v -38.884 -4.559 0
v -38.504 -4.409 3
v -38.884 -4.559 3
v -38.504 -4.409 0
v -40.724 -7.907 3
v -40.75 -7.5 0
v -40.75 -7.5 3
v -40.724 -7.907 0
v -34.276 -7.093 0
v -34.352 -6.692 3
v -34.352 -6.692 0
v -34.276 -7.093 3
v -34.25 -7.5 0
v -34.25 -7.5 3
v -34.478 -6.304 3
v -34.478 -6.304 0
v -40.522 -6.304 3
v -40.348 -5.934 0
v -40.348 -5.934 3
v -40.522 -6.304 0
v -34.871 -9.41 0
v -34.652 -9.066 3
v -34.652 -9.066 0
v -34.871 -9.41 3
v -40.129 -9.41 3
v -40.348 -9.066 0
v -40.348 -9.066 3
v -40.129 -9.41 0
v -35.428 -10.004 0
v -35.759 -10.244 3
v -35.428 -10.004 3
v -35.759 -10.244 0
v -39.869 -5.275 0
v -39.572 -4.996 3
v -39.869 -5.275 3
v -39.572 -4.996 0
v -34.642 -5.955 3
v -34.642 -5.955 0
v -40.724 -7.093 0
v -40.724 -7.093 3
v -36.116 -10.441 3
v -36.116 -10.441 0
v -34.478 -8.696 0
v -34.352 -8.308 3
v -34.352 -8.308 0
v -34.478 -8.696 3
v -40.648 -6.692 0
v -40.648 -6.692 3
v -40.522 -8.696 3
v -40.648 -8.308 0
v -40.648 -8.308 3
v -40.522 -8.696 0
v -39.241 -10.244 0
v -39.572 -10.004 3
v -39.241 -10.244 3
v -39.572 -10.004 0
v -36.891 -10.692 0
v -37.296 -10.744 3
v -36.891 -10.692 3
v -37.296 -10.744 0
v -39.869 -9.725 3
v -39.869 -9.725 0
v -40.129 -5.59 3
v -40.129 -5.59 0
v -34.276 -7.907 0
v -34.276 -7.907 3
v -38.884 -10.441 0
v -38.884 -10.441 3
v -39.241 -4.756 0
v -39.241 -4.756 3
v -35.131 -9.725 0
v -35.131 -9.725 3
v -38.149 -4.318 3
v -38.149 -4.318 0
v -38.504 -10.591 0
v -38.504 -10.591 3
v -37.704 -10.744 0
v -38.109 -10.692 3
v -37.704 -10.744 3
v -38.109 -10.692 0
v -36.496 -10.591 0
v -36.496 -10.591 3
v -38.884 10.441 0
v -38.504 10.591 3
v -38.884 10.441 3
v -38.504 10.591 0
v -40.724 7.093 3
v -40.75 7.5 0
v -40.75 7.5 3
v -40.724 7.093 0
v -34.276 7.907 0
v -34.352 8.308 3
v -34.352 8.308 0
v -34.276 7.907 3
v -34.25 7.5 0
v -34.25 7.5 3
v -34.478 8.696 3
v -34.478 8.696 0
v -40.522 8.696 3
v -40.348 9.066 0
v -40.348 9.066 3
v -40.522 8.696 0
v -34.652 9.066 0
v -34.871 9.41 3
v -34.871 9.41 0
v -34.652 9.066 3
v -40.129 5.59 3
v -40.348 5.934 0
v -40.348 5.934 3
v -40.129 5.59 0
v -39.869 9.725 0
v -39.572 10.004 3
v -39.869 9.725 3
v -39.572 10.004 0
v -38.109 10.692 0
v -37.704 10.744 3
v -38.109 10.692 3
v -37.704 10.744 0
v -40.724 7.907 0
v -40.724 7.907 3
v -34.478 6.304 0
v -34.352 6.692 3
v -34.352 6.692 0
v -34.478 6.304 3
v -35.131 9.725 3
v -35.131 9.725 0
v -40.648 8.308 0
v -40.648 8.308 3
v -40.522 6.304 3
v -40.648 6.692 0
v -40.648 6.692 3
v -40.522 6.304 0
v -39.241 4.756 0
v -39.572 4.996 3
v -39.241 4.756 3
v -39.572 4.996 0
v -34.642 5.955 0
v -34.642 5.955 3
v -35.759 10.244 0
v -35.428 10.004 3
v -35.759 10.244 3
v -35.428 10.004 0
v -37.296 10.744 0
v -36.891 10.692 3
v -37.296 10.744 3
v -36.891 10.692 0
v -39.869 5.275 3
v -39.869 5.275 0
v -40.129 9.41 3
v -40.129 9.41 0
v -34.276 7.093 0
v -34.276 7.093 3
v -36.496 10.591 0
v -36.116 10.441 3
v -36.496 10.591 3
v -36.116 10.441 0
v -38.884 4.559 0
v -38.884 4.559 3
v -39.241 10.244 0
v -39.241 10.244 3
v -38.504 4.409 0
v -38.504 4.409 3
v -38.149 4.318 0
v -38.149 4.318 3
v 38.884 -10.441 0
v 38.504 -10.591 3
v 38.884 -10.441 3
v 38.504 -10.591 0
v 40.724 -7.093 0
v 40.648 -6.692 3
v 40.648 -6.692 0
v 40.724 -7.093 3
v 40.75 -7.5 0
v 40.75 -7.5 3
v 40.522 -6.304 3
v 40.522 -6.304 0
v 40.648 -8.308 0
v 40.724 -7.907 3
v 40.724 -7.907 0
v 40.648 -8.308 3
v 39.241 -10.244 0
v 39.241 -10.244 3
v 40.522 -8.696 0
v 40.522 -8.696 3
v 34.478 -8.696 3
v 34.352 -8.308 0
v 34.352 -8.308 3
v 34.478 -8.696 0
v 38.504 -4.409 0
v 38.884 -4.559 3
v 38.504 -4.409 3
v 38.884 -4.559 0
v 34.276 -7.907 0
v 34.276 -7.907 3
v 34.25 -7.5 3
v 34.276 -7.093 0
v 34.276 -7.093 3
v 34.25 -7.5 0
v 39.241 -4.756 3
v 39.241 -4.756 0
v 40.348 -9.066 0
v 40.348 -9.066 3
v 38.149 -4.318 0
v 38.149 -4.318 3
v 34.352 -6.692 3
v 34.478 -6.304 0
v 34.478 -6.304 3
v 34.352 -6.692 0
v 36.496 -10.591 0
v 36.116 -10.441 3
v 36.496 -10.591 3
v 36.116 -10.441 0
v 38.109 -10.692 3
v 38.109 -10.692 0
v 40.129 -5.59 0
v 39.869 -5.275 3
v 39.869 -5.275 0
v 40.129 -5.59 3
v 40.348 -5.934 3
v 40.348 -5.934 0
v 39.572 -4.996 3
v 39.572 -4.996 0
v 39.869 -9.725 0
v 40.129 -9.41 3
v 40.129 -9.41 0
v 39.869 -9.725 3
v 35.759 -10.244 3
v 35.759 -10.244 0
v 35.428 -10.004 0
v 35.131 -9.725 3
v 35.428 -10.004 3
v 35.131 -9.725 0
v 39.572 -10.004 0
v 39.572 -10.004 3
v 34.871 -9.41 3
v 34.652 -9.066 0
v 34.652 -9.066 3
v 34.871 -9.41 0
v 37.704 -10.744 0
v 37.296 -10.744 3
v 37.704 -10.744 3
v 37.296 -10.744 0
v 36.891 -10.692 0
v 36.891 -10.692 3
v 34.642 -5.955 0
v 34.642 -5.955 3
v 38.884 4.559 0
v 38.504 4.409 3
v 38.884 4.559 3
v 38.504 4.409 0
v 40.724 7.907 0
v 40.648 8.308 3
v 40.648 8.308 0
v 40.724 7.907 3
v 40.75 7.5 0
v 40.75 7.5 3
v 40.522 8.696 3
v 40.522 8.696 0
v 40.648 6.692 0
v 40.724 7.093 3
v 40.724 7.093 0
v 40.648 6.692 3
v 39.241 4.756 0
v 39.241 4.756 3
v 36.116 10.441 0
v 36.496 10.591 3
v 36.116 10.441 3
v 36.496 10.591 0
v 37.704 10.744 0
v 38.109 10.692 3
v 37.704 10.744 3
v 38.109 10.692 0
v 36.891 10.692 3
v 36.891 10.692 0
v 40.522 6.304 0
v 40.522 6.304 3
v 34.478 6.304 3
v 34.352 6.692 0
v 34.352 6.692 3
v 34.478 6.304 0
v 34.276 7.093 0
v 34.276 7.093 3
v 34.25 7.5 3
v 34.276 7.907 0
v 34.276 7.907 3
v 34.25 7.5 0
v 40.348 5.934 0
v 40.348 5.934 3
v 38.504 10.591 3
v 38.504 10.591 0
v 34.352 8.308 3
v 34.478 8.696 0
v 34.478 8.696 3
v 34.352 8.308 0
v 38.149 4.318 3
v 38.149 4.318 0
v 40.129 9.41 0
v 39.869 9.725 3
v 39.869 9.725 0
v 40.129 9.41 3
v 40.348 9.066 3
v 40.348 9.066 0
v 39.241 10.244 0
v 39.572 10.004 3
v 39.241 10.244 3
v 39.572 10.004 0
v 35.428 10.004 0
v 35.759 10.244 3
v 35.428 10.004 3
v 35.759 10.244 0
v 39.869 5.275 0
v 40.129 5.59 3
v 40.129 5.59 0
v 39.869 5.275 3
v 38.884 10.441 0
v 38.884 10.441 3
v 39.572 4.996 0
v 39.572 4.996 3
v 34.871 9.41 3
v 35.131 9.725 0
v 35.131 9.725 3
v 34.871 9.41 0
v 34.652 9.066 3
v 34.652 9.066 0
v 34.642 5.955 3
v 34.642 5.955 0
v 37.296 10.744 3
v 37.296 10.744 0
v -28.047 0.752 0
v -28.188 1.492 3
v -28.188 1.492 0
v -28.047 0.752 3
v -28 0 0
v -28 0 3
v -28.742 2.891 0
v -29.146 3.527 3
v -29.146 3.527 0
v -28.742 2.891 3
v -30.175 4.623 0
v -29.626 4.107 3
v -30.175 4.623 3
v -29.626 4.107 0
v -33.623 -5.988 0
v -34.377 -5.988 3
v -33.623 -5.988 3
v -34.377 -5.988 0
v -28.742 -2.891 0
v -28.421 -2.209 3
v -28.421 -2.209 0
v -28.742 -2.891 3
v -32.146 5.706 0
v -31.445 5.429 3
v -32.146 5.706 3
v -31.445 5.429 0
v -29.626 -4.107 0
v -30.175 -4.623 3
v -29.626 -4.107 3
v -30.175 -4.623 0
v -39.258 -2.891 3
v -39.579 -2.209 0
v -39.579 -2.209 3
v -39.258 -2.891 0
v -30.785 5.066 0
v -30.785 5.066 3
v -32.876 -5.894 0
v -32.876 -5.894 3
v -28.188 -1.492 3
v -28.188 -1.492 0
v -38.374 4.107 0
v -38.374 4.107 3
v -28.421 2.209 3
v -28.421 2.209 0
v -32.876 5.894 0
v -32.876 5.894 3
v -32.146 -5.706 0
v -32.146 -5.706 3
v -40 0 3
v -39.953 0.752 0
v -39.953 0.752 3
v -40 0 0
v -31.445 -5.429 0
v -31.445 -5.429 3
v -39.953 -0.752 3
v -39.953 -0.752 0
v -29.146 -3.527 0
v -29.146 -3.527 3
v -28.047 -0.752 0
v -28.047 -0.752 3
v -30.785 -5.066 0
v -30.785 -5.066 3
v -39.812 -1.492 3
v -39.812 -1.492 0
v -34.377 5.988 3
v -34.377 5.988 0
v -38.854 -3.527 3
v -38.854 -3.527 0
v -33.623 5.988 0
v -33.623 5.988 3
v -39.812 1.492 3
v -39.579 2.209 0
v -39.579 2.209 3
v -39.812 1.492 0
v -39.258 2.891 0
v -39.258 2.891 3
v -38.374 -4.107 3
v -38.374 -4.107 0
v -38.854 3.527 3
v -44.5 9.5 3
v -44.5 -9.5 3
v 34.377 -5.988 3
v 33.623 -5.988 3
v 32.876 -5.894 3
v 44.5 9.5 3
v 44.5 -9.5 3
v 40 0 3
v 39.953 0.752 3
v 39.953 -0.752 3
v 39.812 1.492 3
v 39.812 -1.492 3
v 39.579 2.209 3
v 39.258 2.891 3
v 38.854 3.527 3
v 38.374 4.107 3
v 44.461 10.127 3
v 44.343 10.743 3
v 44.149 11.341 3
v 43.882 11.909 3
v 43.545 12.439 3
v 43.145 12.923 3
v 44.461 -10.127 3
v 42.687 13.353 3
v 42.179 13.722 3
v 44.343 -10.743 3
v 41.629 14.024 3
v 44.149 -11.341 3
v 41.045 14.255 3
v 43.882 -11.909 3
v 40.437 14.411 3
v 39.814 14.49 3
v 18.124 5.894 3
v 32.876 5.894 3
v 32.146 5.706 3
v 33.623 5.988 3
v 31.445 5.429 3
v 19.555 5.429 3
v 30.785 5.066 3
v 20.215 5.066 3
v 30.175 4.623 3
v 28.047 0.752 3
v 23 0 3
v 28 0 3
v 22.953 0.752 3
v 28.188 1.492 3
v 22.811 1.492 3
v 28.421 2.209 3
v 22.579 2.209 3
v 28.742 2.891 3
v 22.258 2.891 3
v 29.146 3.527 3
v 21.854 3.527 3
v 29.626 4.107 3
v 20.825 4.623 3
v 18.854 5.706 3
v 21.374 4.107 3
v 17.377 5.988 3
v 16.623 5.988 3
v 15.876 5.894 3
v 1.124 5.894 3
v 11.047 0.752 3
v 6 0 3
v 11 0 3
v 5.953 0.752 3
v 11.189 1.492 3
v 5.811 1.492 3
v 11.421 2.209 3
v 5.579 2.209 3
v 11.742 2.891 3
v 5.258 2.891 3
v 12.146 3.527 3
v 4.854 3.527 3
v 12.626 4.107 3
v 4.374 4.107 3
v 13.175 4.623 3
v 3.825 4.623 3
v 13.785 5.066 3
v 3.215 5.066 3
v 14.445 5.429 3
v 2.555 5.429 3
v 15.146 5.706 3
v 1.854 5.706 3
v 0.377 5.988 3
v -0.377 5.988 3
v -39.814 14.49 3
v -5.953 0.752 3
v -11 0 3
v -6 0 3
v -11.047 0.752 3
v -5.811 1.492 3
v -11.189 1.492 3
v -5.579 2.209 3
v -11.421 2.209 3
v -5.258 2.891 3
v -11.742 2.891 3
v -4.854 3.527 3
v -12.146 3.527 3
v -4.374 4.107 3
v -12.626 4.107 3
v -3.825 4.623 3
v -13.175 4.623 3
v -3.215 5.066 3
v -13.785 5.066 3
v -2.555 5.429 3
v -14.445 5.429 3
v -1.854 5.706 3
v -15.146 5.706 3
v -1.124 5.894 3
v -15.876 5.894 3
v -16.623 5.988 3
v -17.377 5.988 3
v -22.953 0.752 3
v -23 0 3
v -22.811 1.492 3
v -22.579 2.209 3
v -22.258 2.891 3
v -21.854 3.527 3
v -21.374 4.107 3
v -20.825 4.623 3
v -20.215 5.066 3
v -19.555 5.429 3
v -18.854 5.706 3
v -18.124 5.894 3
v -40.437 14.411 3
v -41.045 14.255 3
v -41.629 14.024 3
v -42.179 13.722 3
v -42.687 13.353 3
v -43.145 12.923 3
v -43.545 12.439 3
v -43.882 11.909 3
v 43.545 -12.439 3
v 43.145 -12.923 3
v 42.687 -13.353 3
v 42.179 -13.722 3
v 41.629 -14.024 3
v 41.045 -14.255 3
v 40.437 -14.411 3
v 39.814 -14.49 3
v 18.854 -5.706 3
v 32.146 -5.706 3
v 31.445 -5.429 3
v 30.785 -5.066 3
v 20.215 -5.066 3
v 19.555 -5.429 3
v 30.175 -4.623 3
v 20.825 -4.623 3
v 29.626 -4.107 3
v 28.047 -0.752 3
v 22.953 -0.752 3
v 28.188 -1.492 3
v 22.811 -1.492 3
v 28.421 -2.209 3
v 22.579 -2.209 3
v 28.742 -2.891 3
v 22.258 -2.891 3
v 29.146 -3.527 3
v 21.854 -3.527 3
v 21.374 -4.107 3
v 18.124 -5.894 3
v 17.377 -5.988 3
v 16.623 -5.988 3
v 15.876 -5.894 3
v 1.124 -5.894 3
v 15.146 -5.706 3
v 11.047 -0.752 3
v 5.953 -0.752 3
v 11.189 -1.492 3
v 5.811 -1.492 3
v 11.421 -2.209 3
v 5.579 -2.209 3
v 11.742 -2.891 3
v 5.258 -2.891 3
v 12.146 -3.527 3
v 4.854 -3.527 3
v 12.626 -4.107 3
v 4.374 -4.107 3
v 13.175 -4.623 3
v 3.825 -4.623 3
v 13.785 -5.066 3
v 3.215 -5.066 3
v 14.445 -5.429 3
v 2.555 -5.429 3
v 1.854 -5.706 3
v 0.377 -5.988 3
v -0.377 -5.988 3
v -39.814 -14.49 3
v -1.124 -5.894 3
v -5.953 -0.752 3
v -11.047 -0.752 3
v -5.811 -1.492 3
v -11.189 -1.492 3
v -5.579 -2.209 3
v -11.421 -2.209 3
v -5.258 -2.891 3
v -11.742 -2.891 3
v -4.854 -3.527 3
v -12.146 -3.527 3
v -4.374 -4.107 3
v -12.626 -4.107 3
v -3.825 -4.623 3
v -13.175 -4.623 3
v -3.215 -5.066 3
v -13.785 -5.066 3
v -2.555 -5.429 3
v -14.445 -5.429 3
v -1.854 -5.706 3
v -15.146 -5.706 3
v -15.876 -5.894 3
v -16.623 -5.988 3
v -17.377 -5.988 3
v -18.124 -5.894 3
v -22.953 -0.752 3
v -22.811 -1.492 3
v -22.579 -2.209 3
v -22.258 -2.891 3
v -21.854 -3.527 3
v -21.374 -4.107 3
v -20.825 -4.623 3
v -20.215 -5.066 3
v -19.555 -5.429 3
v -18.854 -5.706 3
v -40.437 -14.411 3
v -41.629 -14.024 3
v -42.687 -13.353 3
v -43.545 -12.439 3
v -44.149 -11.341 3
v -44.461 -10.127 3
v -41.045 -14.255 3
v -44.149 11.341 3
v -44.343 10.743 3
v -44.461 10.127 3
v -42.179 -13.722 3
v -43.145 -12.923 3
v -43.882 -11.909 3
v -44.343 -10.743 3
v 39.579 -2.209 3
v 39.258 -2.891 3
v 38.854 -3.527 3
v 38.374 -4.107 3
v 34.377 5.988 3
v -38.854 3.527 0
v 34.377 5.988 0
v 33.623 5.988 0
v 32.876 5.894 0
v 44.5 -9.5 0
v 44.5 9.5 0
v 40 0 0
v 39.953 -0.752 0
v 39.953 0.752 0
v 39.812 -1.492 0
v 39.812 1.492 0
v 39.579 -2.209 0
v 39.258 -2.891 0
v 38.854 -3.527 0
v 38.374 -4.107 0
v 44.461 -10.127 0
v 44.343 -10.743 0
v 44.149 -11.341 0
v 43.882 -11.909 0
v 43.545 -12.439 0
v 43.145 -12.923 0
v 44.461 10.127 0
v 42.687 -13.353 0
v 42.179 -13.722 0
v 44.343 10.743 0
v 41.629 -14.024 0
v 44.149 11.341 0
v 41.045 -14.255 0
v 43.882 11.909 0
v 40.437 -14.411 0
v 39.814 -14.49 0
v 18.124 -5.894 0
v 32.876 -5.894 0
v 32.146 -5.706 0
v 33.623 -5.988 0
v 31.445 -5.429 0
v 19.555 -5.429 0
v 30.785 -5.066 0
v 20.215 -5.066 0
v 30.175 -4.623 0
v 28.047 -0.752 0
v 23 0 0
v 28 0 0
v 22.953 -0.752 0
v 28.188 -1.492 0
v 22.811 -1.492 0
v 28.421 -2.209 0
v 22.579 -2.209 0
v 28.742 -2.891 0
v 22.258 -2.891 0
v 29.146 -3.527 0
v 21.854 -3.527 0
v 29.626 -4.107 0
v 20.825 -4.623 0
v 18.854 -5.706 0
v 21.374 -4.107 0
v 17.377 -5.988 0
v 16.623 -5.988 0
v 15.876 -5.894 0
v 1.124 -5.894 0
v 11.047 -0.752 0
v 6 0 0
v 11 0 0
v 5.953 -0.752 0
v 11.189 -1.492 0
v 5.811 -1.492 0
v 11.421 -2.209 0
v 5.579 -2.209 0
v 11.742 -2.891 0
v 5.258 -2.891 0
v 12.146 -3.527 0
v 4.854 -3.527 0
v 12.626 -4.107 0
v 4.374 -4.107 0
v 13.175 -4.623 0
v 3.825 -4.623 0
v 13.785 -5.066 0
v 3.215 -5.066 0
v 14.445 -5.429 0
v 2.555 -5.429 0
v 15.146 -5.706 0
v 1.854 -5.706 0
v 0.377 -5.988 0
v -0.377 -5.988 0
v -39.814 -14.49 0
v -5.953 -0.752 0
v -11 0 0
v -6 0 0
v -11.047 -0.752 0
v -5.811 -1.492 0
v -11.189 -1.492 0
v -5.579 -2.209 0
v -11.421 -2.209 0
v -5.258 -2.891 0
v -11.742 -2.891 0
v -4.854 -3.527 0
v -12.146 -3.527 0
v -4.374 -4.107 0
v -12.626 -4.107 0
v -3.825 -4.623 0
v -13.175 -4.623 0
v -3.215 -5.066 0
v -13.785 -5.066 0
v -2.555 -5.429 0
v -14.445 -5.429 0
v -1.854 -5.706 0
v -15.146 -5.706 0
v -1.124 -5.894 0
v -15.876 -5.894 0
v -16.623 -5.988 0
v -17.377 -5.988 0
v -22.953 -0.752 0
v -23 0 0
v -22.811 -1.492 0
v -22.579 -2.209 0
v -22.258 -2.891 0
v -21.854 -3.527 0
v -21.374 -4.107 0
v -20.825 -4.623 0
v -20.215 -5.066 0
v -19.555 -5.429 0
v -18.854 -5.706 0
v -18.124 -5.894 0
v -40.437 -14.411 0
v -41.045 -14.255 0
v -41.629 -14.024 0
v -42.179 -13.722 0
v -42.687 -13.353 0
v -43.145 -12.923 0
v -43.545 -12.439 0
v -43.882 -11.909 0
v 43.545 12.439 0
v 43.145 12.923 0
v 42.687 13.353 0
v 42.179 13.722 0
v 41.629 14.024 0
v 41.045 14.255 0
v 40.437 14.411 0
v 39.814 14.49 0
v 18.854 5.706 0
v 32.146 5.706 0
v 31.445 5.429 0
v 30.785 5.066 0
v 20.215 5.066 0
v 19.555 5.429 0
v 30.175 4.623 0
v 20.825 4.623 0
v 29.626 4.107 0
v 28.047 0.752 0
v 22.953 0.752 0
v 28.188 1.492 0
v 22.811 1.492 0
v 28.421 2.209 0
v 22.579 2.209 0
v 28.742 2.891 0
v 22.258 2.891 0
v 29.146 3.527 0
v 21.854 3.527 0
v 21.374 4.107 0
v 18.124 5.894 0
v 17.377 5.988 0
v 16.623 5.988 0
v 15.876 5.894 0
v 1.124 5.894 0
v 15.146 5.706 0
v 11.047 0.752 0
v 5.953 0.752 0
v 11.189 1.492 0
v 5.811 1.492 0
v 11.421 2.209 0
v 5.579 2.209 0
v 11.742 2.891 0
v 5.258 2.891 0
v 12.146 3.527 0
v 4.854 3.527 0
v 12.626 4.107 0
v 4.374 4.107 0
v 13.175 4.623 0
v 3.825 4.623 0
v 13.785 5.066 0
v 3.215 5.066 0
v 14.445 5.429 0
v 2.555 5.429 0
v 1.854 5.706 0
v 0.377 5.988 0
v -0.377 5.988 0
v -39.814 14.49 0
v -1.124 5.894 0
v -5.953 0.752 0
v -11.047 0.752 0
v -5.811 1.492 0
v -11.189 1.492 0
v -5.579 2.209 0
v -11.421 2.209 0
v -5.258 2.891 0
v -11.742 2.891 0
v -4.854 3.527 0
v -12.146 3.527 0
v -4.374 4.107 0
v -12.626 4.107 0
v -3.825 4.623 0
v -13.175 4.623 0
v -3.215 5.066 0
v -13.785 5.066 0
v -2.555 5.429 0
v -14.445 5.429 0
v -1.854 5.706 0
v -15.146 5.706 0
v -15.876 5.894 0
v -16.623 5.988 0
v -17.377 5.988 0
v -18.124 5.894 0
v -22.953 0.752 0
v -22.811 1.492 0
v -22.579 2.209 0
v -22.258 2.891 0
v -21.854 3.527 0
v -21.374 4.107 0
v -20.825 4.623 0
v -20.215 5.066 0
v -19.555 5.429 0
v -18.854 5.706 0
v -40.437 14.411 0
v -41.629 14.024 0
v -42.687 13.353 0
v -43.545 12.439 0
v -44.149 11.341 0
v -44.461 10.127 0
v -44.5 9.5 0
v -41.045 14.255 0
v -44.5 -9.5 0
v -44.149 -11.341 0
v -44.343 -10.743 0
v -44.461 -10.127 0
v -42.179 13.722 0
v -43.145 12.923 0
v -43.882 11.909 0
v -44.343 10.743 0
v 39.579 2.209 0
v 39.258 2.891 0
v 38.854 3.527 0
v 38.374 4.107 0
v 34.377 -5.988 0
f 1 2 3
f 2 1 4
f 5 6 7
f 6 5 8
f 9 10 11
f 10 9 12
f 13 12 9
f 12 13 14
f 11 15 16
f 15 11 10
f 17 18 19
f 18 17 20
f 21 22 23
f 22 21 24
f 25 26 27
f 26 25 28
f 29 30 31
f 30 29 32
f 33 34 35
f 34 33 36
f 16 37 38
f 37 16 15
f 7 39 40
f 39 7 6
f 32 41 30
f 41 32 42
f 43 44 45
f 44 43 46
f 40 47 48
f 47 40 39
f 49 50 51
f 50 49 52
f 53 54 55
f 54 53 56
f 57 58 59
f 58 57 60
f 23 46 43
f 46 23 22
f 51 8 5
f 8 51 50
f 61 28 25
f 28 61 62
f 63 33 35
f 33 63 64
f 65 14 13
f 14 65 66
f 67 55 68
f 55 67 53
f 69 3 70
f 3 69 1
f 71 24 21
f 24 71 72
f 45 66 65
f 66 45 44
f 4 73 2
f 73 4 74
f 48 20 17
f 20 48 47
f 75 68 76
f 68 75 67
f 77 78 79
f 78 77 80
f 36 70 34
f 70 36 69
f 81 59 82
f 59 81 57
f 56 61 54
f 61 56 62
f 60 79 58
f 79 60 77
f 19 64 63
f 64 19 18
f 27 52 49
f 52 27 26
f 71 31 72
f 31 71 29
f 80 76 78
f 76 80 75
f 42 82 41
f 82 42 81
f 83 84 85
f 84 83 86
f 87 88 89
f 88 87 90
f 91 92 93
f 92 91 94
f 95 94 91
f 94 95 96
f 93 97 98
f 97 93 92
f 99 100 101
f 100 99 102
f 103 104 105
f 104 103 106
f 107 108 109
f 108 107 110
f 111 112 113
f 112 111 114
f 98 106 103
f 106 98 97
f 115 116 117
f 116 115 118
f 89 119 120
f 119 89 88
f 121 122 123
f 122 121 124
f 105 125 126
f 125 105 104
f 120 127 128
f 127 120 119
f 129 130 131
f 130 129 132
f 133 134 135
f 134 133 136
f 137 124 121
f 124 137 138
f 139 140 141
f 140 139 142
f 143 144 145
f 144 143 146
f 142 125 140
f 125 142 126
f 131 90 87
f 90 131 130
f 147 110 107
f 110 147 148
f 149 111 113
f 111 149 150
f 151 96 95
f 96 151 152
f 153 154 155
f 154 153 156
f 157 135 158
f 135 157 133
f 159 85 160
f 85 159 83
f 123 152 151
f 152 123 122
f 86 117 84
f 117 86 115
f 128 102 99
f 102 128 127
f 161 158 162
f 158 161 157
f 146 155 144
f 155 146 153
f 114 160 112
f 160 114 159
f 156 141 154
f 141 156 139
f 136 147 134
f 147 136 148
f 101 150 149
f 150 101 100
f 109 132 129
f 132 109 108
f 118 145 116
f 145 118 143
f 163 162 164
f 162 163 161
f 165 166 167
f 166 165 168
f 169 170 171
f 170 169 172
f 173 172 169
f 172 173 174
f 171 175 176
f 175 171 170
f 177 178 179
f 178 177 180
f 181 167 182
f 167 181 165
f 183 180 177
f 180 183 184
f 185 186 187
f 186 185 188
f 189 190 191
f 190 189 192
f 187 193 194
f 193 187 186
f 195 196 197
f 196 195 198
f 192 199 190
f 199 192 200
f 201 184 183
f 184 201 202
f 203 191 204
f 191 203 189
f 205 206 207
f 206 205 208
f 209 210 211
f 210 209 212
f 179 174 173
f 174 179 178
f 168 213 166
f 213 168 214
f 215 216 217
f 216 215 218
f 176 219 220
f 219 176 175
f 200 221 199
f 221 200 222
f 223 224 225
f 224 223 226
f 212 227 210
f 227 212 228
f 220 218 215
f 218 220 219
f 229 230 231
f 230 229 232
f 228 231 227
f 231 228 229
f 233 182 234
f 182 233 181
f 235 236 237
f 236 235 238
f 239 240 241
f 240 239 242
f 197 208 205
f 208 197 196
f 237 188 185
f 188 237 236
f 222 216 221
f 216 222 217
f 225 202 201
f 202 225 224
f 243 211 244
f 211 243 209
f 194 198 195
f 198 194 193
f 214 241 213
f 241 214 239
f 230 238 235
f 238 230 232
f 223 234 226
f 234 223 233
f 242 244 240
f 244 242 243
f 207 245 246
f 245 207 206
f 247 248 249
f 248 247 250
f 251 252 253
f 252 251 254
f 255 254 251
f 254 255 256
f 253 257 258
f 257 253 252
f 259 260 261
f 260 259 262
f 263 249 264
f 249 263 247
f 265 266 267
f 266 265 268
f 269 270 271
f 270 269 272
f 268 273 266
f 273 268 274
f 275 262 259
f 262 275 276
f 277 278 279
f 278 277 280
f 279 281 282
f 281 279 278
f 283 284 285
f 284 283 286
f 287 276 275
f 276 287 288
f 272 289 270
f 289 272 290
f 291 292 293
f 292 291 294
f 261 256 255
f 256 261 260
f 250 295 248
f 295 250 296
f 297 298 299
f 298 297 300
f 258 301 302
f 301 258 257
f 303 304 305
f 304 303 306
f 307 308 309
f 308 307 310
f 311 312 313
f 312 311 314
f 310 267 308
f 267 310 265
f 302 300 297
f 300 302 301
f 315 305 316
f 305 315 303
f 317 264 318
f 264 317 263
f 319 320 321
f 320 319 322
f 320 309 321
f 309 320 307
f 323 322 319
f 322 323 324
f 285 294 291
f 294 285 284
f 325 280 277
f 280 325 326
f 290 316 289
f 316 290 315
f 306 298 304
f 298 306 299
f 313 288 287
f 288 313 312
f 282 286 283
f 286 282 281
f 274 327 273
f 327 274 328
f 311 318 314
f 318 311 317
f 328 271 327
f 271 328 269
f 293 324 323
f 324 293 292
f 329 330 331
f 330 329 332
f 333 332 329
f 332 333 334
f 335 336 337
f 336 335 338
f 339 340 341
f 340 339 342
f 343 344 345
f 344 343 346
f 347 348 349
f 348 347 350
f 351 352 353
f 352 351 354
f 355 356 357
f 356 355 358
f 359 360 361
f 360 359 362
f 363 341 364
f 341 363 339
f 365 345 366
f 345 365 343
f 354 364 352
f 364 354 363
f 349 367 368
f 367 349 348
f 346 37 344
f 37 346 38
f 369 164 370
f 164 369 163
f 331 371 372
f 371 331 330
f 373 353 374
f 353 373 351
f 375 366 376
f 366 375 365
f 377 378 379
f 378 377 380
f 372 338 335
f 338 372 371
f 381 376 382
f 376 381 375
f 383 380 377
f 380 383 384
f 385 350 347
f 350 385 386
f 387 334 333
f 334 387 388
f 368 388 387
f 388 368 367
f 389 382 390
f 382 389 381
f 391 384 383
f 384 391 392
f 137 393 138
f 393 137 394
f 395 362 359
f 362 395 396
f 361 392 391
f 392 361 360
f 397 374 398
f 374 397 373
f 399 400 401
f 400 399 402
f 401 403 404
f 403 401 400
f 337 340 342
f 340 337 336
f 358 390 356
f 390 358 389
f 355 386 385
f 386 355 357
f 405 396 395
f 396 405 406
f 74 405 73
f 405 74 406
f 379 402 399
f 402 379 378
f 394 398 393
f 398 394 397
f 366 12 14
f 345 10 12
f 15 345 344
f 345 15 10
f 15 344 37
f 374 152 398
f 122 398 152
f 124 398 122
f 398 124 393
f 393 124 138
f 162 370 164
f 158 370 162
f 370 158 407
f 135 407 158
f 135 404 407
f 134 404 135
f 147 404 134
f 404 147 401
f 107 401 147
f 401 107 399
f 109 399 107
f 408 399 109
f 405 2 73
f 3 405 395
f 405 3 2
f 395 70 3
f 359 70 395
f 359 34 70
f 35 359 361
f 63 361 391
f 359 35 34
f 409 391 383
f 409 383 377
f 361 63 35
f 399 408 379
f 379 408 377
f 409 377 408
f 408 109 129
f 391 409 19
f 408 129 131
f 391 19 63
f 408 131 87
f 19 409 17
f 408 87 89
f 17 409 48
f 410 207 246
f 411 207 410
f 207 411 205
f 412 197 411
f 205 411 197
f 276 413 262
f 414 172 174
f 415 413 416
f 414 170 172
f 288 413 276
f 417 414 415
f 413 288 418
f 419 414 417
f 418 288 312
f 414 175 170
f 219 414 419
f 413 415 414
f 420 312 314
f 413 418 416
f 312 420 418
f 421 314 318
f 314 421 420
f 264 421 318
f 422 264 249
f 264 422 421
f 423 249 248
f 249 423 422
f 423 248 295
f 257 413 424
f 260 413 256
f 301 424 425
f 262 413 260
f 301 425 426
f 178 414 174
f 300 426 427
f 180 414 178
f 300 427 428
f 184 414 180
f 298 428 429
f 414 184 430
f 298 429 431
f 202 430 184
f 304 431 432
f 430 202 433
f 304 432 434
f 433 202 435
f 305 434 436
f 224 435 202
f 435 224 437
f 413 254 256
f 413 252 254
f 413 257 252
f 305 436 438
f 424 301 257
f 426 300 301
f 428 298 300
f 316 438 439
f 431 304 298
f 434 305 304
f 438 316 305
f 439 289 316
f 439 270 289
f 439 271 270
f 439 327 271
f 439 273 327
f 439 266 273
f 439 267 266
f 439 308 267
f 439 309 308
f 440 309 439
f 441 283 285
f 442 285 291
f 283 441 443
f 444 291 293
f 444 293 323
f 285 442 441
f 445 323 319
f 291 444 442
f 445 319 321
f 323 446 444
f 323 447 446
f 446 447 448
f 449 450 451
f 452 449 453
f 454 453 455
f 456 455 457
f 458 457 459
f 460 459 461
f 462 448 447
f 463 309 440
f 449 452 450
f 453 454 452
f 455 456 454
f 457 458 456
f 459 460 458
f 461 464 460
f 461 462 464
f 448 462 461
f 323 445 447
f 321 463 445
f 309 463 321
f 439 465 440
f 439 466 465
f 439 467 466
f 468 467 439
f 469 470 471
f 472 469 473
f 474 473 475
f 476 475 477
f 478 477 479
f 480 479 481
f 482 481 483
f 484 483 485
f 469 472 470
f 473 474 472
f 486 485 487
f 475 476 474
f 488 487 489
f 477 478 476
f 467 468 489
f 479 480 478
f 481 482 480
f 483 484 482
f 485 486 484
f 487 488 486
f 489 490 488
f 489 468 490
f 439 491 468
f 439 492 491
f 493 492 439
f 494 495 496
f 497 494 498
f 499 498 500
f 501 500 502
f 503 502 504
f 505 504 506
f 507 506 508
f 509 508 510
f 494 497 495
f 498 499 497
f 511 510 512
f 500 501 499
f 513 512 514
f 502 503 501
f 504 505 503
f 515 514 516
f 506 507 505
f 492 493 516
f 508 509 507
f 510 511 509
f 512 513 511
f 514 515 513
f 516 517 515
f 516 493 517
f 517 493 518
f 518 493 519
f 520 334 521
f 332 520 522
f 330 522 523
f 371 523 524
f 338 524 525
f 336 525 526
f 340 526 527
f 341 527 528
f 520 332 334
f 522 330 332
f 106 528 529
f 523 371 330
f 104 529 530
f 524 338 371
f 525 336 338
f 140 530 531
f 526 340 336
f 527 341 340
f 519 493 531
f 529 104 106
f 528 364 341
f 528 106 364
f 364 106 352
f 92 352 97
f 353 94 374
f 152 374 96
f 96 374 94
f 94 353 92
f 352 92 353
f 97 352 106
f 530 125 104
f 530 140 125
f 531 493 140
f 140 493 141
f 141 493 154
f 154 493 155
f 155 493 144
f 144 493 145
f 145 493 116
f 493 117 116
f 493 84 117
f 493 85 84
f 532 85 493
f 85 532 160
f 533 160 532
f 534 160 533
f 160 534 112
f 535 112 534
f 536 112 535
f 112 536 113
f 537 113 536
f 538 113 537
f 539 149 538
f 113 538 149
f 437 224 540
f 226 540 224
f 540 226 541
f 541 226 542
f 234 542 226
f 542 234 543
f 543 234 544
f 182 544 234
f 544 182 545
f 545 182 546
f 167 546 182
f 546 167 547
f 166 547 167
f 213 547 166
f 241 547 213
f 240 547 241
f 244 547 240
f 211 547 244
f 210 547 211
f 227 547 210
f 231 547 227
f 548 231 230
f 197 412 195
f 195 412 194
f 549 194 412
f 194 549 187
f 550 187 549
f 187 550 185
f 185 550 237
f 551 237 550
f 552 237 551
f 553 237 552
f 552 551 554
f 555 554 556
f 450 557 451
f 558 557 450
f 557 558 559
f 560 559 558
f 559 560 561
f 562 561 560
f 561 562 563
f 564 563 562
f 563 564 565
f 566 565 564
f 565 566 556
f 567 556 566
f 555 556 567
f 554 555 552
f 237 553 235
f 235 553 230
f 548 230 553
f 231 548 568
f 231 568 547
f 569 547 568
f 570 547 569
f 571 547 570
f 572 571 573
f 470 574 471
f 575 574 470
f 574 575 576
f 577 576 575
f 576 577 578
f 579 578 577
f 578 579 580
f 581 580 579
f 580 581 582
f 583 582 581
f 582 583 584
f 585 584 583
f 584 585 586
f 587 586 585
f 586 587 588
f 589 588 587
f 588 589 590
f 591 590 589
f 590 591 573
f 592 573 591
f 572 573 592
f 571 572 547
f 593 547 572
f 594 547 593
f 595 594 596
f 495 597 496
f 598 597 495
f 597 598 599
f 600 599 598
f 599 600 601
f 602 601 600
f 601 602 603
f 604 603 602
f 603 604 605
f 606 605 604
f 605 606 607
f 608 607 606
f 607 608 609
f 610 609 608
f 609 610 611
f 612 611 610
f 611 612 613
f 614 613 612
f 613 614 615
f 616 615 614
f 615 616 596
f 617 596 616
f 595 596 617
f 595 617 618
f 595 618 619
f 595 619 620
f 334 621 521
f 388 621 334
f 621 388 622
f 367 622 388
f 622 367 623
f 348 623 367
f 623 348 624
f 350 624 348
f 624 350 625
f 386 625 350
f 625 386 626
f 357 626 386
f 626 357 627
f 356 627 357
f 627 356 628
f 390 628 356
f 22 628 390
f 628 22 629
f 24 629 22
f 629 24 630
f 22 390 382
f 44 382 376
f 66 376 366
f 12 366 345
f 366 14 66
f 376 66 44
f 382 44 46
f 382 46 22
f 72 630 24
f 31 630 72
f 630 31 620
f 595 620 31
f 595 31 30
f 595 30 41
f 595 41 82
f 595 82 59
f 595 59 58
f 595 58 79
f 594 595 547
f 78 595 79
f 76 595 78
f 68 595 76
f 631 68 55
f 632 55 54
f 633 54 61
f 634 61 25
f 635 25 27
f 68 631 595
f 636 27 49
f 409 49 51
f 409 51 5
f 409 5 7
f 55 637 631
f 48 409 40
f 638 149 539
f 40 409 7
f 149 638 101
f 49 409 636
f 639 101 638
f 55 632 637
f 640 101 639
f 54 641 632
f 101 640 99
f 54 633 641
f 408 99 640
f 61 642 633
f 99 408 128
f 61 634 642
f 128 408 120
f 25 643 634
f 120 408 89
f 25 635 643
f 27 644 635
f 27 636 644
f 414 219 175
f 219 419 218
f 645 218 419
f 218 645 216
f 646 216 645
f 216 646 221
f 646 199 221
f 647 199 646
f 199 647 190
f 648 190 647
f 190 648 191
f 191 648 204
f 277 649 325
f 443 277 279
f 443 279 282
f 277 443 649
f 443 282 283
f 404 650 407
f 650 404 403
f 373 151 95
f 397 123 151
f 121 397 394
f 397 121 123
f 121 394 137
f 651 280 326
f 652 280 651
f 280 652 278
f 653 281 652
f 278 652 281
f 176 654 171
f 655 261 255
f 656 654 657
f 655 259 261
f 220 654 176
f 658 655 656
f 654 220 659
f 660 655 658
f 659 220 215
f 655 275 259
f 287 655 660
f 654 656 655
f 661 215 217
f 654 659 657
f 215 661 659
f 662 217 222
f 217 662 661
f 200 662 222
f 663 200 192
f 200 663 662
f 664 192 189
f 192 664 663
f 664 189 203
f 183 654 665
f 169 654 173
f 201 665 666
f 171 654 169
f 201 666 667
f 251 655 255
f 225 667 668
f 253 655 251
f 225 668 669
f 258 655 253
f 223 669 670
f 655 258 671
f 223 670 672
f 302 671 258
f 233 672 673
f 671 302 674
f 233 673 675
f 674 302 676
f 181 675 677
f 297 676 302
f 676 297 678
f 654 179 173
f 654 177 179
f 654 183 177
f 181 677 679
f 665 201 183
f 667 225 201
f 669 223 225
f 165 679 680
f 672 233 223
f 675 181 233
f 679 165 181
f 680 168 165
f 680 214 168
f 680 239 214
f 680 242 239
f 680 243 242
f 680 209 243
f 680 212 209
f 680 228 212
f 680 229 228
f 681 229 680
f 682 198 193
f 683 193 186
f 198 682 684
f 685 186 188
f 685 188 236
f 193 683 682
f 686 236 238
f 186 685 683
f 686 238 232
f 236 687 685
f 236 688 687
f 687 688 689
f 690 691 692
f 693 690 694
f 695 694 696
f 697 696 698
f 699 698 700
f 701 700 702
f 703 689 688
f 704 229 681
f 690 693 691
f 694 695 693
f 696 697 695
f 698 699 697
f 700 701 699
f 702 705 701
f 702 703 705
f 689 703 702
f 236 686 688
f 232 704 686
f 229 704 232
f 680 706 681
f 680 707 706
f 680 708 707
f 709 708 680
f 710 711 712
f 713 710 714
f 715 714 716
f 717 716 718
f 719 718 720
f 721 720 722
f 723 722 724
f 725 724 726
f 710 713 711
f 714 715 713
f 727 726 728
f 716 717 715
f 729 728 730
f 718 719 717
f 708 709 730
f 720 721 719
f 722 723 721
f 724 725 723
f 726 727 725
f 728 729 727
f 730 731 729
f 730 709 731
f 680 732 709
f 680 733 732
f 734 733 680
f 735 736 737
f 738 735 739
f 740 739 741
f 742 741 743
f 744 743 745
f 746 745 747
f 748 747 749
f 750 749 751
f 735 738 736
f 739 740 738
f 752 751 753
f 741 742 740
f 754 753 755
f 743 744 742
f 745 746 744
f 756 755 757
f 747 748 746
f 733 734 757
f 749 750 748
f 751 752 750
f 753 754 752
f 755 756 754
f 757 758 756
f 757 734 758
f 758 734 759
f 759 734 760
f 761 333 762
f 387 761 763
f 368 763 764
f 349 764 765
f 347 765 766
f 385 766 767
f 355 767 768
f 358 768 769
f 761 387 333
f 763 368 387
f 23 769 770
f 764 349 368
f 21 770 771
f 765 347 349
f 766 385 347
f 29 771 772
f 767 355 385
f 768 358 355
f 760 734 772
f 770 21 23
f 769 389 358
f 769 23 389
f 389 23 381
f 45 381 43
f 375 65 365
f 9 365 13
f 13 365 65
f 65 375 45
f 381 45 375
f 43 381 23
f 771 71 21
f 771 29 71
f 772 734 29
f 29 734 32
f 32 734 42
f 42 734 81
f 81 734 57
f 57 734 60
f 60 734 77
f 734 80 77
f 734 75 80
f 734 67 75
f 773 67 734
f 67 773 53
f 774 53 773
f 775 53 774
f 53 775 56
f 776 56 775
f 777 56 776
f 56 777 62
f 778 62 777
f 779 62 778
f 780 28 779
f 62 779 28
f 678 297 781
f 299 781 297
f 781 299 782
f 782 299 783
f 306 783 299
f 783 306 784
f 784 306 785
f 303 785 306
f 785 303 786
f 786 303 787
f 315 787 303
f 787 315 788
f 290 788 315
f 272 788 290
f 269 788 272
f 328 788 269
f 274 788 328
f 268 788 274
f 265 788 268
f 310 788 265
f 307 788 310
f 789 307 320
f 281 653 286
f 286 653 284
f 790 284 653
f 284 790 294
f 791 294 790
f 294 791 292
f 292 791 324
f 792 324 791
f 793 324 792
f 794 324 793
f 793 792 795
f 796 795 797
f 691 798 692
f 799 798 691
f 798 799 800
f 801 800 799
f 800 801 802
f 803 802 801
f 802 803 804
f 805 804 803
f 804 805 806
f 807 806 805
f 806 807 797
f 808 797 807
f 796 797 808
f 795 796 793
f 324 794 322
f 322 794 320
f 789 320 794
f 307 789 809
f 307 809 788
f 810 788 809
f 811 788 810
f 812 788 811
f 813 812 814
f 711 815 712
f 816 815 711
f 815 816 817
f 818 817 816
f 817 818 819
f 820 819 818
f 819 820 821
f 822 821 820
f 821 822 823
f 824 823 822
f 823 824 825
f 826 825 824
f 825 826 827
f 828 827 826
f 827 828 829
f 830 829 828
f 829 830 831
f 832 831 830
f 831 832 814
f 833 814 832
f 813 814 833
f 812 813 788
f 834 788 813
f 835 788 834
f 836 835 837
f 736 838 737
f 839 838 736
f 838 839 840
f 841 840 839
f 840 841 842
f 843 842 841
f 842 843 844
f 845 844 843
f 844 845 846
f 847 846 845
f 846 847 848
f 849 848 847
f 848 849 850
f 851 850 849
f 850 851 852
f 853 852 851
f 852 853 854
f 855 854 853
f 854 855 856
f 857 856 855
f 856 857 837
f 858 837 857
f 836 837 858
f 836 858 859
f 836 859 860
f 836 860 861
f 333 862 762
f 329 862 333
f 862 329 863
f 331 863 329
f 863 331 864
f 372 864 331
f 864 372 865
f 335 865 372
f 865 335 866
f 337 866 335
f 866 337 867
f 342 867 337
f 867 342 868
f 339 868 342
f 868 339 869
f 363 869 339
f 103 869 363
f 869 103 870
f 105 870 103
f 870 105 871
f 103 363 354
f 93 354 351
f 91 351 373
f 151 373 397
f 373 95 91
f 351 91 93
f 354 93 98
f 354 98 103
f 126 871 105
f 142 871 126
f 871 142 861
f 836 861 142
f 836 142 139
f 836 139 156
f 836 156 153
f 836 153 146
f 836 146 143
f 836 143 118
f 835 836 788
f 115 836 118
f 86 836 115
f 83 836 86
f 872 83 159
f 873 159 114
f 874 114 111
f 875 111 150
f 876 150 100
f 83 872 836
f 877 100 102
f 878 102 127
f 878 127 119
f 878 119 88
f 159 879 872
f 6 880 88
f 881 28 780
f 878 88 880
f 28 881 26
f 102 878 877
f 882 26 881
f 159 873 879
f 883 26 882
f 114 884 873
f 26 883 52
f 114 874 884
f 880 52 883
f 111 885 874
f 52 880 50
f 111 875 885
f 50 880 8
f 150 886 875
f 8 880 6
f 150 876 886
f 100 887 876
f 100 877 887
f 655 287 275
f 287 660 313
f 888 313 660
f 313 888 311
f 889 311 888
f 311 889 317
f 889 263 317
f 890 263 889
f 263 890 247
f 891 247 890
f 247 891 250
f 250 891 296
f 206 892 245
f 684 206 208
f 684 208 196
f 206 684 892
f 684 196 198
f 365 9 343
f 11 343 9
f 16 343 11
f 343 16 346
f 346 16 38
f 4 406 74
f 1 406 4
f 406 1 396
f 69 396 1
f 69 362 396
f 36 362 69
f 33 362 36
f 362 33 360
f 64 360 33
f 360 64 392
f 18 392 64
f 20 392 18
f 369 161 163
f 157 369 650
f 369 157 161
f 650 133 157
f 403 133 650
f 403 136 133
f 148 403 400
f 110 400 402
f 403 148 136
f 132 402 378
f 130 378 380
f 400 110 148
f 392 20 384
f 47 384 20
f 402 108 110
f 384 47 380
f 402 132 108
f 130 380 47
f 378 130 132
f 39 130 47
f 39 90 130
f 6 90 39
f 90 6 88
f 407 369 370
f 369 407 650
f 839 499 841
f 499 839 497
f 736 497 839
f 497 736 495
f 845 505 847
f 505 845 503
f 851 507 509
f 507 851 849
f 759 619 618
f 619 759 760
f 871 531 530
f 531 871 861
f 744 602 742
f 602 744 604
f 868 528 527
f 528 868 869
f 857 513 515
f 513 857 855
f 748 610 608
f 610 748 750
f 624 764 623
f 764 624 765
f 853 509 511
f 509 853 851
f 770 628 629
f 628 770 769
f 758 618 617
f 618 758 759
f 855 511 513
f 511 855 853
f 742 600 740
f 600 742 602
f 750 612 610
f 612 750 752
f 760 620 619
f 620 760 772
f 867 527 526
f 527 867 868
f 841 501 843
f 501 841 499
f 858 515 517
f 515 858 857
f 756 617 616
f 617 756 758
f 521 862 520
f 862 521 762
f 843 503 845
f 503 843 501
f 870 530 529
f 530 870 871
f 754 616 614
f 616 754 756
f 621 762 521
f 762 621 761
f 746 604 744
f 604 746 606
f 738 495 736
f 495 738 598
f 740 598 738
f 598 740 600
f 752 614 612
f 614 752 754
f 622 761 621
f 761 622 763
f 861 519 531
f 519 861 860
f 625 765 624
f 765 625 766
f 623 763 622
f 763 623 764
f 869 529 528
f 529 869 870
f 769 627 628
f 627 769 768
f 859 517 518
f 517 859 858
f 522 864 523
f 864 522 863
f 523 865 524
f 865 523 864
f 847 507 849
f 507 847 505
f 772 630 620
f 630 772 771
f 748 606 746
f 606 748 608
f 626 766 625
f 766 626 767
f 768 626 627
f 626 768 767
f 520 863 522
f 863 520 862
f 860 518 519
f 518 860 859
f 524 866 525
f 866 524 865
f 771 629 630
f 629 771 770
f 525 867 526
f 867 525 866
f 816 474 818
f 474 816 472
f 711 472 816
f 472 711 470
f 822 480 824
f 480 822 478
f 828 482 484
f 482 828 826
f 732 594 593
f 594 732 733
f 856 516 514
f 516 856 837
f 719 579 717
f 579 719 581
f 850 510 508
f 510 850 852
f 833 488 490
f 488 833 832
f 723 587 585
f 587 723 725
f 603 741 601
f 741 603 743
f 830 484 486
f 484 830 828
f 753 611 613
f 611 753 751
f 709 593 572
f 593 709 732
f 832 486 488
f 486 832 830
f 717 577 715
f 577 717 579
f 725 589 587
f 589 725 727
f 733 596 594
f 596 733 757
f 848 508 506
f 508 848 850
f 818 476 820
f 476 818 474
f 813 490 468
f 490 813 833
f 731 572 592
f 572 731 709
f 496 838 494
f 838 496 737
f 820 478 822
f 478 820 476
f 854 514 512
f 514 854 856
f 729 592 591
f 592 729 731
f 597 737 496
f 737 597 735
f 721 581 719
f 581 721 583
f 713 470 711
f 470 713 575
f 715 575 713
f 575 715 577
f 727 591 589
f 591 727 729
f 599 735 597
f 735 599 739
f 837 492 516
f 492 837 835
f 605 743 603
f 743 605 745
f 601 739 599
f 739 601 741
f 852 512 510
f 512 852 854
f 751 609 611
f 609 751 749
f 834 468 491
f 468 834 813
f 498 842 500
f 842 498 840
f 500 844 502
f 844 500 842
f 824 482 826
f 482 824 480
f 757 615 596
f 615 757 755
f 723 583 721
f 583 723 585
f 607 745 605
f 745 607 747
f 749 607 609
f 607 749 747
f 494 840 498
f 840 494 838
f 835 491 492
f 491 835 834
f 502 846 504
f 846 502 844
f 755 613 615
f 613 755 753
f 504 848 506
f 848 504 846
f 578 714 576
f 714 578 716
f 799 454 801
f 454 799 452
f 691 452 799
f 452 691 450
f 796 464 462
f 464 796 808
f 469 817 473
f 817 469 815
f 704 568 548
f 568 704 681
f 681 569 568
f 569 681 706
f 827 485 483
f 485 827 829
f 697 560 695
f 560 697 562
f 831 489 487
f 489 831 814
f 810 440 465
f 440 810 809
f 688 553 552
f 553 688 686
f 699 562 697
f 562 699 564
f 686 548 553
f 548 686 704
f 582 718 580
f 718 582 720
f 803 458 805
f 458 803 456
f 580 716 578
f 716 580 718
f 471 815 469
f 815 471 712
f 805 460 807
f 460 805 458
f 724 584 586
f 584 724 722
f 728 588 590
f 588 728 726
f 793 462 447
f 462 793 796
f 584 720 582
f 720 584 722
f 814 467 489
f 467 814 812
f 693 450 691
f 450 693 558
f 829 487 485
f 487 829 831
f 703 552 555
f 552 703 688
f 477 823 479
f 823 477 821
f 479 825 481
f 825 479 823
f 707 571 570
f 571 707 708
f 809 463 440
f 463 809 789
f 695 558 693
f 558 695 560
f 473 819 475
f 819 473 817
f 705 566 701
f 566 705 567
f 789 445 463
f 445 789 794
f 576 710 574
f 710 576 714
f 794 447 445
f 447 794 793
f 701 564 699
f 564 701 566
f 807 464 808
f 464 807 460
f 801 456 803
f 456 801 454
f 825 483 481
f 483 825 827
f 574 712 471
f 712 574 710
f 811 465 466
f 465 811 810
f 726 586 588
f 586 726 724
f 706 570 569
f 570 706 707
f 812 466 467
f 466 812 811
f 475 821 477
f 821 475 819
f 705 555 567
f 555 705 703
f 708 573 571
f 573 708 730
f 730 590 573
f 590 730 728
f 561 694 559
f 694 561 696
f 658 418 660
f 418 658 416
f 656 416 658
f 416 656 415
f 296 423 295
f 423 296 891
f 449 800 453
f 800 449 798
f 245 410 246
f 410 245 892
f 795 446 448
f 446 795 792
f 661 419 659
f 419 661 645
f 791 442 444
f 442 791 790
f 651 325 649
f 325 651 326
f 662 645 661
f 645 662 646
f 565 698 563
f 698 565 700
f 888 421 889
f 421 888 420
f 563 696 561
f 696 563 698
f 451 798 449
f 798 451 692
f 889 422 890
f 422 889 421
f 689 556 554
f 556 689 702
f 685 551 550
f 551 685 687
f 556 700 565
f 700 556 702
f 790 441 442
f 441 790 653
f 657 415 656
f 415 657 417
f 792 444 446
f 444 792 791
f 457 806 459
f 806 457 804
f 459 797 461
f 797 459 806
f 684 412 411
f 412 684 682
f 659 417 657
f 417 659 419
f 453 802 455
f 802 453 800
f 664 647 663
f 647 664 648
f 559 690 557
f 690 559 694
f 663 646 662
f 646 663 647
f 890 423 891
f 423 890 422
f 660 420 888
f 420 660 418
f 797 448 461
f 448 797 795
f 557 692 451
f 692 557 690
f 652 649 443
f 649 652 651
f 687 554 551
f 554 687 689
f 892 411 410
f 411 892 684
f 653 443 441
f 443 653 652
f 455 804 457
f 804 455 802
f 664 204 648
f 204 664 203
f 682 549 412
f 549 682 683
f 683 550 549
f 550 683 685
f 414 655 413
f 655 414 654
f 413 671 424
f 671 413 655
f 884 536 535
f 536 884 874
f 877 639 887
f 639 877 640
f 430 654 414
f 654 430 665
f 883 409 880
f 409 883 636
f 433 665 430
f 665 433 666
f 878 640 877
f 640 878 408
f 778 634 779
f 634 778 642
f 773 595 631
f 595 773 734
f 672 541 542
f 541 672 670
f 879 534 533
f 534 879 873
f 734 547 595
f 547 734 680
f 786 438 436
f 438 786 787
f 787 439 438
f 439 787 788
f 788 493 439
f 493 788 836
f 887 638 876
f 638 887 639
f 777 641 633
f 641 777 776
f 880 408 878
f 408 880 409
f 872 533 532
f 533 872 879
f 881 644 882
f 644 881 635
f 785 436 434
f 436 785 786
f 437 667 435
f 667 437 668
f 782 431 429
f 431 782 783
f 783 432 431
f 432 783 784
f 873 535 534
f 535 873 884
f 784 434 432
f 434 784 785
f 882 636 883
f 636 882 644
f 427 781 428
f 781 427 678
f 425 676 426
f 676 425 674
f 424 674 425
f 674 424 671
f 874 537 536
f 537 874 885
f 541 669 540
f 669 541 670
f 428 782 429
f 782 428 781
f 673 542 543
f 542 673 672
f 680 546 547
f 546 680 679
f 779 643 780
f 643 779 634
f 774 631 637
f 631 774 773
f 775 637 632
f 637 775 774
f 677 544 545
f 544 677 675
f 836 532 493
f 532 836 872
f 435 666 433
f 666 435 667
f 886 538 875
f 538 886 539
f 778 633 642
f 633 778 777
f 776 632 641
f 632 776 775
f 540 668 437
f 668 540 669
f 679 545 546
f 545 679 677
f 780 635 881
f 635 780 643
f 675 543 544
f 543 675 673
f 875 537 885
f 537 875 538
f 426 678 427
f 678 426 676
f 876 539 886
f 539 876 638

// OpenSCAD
$fn = 50;


difference() {
	union() {
		hull() {
			translate(v = [-39.5000000000, 9.5000000000, 0]) {
				cylinder(h = 3, r = 5);
			}
			translate(v = [39.5000000000, 9.5000000000, 0]) {
				cylinder(h = 3, r = 5);
			}
			translate(v = [-39.5000000000, -9.5000000000, 0]) {
				cylinder(h = 3, r = 5);
			}
			translate(v = [39.5000000000, -9.5000000000, 0]) {
				cylinder(h = 3, r = 5);
			}
		}
	}
	union() {
		#translate(v = [-37.5000000000, -7.5000000000, -100.0000000000]) {
			cylinder(h = 200, r = 3.2500000000);
		}
		#translate(v = [-37.5000000000, 7.5000000000, -100.0000000000]) {
			cylinder(h = 200, r = 3.2500000000);
		}
		#translate(v = [37.5000000000, -7.5000000000, -100.0000000000]) {
			cylinder(h = 200, r = 3.2500000000);
		}
		#translate(v = [37.5000000000, 7.5000000000, -100.0000000000]) {
			cylinder(h = 200, r = 3.2500000000);
		}
		#translate(v = [-34.0000000000, 0, 0]) {
			cylinder(h = 3, r = 6.0000000000);
		}
		#translate(v = [-17.0000000000, 0, 0]) {
			cylinder(h = 3, r = 6.0000000000);
		}
		#cylinder(h = 3, r = 6.0000000000);
		#translate(v = [17.0000000000, 0, 0]) {
			cylinder(h = 3, r = 6.0000000000);
		}
		#translate(v = [34.0000000000, 0, 0]) {
			cylinder(h = 3, r = 6.0000000000);
		}
	}
}
